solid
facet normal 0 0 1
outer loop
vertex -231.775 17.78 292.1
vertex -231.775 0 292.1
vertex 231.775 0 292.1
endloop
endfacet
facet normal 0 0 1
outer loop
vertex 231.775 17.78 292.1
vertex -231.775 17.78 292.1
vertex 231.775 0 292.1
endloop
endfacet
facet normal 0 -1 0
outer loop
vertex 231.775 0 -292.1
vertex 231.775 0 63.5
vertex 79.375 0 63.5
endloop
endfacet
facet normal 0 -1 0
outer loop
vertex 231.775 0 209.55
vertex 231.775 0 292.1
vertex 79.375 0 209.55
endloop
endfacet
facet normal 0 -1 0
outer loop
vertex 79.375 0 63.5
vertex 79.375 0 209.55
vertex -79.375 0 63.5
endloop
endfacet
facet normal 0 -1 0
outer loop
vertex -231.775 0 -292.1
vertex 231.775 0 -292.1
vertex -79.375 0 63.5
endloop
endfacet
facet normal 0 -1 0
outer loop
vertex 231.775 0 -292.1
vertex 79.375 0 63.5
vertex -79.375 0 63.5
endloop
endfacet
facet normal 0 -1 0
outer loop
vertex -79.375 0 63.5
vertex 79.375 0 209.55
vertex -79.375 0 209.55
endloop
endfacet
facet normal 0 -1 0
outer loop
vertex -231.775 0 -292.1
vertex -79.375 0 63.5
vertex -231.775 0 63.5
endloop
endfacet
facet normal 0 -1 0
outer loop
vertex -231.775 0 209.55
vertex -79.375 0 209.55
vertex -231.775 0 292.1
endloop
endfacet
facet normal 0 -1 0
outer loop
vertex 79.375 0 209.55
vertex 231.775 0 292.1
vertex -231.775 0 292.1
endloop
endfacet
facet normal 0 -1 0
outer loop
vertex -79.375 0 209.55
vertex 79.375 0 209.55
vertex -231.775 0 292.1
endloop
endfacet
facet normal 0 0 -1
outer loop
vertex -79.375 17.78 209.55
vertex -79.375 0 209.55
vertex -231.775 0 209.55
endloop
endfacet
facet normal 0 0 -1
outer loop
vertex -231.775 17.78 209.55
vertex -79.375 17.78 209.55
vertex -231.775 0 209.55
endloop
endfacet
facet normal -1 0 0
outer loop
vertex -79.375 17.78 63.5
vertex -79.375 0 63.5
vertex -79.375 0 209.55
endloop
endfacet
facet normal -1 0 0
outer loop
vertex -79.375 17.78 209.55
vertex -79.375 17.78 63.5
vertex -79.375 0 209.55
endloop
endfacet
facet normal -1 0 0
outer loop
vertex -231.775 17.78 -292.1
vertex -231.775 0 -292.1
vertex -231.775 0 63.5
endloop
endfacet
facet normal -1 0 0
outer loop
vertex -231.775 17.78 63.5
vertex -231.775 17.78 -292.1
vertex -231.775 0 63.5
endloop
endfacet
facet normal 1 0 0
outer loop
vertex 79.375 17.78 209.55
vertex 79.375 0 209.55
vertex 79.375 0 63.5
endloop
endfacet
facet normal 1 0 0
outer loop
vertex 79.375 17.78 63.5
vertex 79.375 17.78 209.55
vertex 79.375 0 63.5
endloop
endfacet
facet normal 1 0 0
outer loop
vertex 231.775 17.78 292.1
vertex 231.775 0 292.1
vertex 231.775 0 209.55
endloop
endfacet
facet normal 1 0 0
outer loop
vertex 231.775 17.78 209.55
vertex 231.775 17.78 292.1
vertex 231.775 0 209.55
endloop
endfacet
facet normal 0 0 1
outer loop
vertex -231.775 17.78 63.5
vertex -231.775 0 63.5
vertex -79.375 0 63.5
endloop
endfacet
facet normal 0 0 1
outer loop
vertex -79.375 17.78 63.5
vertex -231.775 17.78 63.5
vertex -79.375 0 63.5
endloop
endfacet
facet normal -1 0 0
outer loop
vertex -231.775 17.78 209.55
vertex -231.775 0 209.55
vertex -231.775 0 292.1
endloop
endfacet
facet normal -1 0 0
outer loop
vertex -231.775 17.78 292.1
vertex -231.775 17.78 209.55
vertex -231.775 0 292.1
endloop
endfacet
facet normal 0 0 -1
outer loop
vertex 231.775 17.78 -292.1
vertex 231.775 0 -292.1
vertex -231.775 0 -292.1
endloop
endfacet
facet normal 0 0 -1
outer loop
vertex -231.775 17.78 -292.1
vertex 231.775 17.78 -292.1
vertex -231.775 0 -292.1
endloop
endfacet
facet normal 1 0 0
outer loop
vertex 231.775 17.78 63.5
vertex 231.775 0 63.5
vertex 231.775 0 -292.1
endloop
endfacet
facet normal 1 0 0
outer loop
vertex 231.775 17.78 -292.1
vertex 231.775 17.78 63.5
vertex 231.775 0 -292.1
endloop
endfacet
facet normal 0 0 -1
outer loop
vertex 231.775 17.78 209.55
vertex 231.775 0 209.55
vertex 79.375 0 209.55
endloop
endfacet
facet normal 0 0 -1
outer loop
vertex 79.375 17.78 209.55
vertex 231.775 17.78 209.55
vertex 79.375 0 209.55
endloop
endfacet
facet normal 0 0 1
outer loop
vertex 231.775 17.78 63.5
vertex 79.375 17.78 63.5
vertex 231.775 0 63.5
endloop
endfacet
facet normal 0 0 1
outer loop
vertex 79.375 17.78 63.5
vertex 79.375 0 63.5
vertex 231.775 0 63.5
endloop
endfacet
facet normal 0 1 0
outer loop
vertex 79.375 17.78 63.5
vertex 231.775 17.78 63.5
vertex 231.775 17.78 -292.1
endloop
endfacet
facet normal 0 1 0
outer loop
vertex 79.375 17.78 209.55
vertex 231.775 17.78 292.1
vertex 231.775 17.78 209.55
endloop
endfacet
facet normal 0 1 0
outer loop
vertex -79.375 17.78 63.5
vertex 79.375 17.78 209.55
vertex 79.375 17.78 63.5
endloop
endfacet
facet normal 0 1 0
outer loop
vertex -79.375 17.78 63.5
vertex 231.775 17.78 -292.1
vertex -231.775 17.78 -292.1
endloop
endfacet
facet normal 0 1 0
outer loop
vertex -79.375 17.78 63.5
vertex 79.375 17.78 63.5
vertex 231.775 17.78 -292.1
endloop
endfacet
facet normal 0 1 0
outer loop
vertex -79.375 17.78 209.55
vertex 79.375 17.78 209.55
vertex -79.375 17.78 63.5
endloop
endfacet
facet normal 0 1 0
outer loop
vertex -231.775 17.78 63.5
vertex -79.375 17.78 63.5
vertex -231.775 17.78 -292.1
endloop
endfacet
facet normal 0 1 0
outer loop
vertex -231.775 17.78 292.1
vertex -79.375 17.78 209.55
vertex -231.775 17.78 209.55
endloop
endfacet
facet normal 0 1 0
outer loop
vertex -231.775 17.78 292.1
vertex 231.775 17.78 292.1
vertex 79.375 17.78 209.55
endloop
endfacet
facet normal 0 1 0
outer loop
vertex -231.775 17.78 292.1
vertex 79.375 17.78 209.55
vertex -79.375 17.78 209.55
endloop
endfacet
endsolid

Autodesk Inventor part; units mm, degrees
ref_plane "XZ Plane" through (0, 0, 0) normal (0, 1, 0) x (-1, 0, 0)
ref_plane "XY Plane" through (0, 0, 0) normal (0, 0, 1) x (1, 0, 0)
sketch "Sketch1" plane through (0, 0, 0) normal (0, 1, 0) x (-1, 0, 0)
  line L0 (-231.775, 292.1) -> (-231.775, -292.1)
  line L1 (-231.775, -292.1) -> (231.775, -292.1)
  line L2 (231.775, -292.1) -> (231.775, 292.1)
  line L3 (231.775, 292.1) -> (-231.775, 292.1)
  line L4 (-231.775, 292.1) -> (231.775, -292.1) construction
  line L5 (-231.775, -292.1) -> (231.775, 292.1) construction
  point P0 (0, 0)
  dimension "baseLength" = 584.2
  dimension "baseWidth" = 463.55
extrude "Extrusion1" add sketch "Sketch1" along normal blind 17.78
sketch "Sketch2" plane through (0, 0, 0) normal (0, -1, 0) x (1, 0, 0)
  line L0 (231.775, 292.1) -> (231.775, -292.1) projected
  line L1 (231.775, 209.55) -> (79.375, 209.55)
  line L2 (79.375, 209.55) -> (79.375, 63.5)
  line L3 (79.375, 63.5) -> (231.775, 63.5)
  line L4 (231.775, 63.5) -> (231.775, 209.55)
  line L5 (-231.775, 292.1) -> (231.775, 292.1) projected
  point P0 (0, 0)
  dimension "backToEndOfGearBox" = 82.55
  dimension "backToFrontOfGearBox" = 228.6
  dimension "wdithForGearBox" = 152.4
extrude "Extrusion2" cut sketch "Sketch2" against normal through all
mirror "Mirror1" about plane through (0, 0, 0) normal (1, 0, 0) of "Extrusion2"
equation "\"spaceingAlongSides\" = 3.175"
equation "\"distanceFromBackForEndBolt\" = 38.1"
equation "\"spacingForBolt\" = 25.4"
equation "\"widthOfSpacingForBolt\" = 12.7"
equation "\"lengthOfSpacingForBolt\" = 25.4"
properties part number "RhinoBottomFloorPlate02" material "Wood (Birch)"
